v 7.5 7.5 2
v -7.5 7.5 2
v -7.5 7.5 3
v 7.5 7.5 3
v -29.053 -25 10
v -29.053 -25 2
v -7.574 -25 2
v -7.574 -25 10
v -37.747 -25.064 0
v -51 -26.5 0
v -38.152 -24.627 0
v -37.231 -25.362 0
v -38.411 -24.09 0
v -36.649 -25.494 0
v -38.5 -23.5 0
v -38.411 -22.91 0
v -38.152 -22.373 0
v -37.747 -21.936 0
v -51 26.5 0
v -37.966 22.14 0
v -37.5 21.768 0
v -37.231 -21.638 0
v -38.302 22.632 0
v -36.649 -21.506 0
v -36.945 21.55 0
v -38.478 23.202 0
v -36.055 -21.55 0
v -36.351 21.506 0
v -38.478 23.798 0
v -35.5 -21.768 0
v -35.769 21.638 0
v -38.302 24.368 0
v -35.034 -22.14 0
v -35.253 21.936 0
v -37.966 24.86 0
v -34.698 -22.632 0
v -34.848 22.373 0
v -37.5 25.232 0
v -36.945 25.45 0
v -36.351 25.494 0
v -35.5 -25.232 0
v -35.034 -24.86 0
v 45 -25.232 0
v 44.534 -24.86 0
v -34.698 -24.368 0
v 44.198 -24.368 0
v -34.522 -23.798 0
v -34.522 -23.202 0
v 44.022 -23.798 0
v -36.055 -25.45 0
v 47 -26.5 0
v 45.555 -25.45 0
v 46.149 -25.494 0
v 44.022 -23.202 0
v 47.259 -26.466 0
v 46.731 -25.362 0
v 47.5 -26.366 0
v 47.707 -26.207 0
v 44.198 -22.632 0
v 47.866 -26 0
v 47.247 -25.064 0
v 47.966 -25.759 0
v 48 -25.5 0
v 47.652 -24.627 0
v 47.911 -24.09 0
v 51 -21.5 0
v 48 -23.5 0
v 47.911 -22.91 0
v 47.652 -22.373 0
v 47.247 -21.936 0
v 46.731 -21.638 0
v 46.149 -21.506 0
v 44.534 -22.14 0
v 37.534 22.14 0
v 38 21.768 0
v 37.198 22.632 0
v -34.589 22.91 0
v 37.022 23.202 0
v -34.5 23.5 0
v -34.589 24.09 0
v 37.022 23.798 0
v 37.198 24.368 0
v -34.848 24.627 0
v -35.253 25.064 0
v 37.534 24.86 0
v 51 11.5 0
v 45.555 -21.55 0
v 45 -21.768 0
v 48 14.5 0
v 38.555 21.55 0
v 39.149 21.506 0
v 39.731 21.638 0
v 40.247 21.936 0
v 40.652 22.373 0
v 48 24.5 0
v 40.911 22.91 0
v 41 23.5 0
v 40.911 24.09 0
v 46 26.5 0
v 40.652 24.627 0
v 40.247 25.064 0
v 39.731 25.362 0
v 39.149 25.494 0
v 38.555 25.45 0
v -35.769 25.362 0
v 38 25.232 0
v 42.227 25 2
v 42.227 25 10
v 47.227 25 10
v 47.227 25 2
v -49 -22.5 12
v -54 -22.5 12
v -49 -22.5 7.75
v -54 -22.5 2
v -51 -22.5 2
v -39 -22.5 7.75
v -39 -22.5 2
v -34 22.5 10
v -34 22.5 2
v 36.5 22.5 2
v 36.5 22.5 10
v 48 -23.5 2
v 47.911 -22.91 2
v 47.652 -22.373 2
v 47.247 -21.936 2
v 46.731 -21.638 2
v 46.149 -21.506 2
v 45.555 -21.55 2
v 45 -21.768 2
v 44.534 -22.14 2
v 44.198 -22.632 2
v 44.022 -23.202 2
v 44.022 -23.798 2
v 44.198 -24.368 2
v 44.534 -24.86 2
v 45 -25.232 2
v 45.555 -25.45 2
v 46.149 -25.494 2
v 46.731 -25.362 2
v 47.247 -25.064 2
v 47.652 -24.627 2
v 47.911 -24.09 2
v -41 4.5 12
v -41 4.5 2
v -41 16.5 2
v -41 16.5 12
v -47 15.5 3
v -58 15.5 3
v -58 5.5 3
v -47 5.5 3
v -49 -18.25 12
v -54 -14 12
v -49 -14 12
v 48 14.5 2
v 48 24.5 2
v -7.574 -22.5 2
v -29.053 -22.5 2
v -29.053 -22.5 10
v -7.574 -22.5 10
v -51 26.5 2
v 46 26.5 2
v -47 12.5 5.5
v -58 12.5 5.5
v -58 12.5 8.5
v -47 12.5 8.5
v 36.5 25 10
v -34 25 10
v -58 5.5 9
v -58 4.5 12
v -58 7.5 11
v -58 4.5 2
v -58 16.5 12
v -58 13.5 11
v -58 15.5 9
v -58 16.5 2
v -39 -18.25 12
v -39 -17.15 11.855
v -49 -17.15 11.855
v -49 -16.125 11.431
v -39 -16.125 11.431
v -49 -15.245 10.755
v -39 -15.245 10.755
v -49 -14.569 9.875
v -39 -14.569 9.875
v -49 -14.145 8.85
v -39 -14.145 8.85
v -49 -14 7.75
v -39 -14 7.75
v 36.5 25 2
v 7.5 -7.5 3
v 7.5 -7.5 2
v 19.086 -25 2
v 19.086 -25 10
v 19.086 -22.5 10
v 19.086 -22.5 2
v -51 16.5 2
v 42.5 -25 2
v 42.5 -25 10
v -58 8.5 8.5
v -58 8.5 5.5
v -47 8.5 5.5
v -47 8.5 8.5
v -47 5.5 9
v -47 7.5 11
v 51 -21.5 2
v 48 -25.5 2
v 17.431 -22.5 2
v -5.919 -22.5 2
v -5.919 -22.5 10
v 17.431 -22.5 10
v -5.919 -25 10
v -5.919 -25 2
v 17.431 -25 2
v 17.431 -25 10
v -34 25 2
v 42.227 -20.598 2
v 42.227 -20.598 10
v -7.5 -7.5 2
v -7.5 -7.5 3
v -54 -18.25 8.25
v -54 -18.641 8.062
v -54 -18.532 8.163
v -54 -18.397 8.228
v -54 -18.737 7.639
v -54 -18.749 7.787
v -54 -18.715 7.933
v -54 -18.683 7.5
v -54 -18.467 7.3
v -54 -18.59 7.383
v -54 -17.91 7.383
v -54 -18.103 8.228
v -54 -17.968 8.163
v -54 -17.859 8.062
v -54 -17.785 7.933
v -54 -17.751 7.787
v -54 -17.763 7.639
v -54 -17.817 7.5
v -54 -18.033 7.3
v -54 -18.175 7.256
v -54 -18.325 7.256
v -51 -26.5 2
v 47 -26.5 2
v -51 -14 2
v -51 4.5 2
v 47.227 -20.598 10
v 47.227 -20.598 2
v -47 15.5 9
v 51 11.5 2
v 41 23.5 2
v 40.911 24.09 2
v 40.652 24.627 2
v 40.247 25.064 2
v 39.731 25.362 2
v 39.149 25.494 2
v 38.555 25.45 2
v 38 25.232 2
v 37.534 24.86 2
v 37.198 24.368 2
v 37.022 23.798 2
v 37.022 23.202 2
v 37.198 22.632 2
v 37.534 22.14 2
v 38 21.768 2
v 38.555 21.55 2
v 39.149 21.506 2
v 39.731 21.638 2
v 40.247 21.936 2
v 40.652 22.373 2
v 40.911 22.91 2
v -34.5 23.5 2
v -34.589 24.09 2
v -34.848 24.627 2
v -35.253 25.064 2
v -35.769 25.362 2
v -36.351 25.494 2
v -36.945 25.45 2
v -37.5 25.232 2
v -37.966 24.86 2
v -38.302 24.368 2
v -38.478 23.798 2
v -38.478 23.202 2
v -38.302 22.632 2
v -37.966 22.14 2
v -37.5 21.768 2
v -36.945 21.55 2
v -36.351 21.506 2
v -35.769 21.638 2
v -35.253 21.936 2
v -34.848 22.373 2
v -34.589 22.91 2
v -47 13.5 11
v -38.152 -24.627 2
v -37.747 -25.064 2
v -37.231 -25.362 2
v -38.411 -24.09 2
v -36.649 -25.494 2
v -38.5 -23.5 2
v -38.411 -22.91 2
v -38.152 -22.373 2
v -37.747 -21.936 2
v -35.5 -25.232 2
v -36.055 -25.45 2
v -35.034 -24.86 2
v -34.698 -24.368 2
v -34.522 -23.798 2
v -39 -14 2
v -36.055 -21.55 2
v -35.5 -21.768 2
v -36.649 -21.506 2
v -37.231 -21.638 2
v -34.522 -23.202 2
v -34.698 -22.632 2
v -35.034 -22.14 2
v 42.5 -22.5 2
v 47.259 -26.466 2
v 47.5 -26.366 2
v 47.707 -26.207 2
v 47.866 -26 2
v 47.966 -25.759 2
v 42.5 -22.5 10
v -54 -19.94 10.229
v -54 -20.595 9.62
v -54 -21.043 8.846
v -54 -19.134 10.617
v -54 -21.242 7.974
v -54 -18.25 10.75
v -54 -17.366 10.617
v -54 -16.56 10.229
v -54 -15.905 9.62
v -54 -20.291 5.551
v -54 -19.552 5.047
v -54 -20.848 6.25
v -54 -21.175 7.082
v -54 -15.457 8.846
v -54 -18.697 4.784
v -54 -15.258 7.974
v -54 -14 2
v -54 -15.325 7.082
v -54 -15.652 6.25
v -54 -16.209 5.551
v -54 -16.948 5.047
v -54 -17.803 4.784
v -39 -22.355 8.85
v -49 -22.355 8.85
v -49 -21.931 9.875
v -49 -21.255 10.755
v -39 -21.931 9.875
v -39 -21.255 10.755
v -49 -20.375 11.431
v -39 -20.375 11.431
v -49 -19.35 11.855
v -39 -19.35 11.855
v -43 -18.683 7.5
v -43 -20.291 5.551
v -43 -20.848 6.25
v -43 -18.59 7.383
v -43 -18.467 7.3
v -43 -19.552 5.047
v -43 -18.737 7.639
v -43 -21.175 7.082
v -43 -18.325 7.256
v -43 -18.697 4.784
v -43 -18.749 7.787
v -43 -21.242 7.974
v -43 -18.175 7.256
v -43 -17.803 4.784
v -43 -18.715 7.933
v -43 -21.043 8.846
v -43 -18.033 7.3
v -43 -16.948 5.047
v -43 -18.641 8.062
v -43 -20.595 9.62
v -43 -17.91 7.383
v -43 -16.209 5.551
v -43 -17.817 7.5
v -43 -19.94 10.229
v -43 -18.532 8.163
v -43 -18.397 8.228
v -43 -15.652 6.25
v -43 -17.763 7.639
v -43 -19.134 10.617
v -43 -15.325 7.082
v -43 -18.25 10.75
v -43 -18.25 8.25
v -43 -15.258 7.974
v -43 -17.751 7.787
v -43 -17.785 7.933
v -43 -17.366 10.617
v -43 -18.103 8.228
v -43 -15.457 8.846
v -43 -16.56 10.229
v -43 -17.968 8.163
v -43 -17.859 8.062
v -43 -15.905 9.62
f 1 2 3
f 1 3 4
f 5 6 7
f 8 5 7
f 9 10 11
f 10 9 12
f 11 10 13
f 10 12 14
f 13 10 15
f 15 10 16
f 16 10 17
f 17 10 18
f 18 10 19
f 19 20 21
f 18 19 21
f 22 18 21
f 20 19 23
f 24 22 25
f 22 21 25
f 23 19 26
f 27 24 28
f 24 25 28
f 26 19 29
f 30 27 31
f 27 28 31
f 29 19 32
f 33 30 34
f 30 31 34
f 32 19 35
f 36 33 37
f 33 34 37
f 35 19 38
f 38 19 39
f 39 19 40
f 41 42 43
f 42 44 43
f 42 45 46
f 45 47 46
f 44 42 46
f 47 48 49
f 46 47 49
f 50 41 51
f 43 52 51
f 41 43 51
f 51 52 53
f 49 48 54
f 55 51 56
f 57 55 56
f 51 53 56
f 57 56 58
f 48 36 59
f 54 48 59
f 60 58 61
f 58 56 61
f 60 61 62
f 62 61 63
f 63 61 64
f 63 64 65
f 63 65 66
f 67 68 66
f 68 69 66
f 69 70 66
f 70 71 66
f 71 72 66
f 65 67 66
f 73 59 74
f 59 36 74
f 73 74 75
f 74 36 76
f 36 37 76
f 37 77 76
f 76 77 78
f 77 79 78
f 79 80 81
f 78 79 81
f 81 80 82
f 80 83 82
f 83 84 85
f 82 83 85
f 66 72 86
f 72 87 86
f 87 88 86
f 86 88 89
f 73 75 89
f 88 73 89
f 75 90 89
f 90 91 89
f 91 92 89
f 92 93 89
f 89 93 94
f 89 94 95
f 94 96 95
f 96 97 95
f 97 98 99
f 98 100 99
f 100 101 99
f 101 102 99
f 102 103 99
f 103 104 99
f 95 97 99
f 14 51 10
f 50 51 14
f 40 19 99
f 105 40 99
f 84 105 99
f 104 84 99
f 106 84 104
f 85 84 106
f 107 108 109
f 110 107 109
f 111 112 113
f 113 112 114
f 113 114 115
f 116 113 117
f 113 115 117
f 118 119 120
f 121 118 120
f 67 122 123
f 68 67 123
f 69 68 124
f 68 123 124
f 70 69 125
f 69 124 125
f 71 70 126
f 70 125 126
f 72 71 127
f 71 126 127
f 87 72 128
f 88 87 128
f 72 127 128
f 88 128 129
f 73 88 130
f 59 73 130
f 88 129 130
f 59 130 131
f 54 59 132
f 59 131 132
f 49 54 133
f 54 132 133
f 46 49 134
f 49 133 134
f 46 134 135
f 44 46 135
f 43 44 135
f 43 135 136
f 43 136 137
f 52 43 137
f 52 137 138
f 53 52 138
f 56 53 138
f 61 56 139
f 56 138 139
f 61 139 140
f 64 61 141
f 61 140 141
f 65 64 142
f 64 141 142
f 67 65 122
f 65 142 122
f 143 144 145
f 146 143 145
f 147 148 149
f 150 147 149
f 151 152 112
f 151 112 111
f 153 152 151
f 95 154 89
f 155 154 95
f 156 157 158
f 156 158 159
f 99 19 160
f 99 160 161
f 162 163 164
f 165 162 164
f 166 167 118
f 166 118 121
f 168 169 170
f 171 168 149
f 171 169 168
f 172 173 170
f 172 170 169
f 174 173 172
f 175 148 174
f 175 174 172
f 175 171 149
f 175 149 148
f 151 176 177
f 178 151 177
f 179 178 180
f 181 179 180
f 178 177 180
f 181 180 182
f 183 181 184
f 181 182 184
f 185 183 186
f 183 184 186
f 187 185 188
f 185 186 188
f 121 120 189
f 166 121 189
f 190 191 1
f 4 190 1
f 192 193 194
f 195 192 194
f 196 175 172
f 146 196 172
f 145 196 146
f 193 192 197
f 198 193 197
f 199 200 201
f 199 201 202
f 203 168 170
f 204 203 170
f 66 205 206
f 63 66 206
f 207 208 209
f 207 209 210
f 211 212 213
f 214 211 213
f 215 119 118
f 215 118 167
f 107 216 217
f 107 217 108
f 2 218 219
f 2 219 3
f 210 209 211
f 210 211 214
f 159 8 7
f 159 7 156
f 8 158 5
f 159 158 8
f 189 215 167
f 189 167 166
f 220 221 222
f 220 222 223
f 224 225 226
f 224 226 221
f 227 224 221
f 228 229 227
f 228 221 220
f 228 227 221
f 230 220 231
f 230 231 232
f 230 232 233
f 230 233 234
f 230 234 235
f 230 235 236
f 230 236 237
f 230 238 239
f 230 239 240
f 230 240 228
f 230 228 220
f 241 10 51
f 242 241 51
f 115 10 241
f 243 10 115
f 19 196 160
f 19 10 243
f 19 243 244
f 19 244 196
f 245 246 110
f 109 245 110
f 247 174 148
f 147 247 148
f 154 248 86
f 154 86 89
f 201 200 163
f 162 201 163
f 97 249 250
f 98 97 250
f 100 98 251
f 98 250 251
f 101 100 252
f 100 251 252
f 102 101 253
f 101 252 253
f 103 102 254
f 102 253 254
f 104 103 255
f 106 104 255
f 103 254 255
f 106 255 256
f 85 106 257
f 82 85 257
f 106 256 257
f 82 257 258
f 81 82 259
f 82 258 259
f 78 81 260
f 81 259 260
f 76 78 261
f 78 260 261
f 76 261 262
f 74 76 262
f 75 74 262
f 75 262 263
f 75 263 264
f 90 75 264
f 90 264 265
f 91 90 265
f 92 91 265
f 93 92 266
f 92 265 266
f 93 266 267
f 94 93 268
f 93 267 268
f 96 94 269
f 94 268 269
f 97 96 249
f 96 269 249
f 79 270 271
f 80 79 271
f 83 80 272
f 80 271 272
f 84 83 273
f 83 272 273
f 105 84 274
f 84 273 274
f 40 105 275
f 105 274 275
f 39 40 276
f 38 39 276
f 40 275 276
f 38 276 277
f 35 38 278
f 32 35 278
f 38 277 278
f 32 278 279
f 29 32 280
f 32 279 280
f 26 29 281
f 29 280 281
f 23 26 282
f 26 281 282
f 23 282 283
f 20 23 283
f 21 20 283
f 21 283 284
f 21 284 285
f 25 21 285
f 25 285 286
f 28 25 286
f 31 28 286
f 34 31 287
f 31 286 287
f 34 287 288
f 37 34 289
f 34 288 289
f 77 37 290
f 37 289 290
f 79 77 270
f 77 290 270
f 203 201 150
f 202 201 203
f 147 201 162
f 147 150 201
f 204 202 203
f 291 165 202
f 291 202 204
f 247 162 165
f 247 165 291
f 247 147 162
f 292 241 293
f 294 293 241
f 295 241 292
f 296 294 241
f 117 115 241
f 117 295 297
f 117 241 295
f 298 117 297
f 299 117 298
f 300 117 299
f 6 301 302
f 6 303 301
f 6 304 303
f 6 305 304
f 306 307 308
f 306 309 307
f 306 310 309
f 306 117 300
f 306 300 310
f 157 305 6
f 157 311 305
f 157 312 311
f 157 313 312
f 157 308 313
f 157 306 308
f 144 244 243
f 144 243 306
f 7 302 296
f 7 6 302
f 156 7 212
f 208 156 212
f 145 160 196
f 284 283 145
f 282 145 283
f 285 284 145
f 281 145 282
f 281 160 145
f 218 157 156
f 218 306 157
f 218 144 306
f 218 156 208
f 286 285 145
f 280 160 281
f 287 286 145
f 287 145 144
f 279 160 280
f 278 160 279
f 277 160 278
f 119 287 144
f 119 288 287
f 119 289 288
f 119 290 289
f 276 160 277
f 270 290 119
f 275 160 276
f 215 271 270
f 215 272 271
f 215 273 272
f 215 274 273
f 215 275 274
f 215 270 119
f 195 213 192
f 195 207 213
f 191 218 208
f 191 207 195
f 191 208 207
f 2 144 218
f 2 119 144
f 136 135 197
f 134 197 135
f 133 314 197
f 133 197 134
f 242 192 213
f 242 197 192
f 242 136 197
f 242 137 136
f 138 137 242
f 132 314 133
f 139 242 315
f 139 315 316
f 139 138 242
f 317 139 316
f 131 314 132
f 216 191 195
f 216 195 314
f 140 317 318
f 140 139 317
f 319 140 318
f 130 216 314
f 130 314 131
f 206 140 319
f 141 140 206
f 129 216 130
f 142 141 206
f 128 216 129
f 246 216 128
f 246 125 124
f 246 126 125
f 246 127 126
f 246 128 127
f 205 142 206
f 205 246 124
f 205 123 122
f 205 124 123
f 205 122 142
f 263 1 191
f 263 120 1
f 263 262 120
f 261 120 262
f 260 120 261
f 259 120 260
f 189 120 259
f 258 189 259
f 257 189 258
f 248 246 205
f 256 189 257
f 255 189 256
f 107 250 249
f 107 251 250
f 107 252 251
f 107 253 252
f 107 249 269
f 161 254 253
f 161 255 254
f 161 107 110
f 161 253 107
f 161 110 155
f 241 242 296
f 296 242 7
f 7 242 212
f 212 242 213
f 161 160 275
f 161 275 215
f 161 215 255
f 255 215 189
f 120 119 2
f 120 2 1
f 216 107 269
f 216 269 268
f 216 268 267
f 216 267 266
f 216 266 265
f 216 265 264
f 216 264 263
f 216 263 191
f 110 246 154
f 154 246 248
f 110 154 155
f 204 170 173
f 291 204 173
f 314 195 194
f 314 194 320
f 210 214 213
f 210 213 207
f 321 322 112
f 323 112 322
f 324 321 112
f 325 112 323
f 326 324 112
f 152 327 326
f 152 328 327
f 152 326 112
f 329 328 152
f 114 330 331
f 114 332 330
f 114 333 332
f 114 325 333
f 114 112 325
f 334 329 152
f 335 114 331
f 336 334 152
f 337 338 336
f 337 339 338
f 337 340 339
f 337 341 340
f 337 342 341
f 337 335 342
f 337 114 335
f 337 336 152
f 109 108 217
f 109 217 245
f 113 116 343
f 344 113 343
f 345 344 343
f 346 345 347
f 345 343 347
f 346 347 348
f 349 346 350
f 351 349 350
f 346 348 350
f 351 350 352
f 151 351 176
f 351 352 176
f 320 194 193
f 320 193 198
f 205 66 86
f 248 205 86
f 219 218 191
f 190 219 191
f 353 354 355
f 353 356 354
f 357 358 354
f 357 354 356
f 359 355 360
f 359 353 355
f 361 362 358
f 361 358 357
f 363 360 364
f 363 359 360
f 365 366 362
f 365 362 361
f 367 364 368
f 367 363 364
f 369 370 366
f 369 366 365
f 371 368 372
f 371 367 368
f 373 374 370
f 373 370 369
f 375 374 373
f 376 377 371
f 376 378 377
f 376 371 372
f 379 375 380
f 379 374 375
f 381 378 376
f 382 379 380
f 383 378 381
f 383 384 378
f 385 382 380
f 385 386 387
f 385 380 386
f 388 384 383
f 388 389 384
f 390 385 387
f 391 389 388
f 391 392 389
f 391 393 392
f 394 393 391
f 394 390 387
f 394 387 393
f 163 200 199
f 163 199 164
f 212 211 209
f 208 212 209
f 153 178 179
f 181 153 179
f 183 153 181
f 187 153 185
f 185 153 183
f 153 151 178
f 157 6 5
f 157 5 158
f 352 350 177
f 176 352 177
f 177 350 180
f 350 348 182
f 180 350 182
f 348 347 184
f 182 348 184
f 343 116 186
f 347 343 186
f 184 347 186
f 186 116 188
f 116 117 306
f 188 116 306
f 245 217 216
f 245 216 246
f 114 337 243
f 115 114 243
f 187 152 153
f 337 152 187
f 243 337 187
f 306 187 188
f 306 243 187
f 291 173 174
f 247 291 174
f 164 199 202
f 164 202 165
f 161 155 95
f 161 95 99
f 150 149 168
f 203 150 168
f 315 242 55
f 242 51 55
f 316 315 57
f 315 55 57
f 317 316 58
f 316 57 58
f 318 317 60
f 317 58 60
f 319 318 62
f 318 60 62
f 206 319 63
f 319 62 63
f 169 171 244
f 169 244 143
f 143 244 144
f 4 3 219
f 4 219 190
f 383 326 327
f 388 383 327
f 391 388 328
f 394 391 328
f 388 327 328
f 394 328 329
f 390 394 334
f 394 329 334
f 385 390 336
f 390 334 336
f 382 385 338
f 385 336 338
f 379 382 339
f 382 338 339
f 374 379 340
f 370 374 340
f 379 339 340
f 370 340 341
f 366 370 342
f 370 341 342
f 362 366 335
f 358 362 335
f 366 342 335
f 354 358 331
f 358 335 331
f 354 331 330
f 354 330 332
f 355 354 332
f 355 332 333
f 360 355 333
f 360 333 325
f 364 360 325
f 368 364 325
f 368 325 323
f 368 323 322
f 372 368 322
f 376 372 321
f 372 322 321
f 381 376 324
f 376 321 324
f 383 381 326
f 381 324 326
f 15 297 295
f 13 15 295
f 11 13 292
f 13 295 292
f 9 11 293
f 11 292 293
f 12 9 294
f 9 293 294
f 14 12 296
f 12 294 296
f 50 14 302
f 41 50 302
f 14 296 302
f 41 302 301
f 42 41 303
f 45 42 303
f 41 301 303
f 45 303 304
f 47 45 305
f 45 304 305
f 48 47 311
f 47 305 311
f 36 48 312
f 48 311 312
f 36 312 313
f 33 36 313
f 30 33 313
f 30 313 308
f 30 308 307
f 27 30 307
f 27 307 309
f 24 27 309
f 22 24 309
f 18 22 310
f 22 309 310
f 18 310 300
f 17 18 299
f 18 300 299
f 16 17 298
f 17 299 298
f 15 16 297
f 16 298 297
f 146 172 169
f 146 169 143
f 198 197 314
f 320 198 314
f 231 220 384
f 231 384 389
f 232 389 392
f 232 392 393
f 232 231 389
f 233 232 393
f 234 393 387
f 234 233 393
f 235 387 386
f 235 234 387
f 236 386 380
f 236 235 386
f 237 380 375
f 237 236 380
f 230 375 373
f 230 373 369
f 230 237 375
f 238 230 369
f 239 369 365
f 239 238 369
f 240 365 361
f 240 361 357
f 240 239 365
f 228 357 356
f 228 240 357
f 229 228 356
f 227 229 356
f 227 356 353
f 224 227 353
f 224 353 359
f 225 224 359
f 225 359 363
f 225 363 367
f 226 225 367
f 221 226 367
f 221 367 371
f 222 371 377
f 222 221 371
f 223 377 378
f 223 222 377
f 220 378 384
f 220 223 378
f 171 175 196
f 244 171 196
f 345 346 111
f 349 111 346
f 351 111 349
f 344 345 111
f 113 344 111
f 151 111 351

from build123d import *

# Parameters (mm, degrees)
SKETCH_2_W          = 102
SKETCH_2_H          = 53
EXTRUDE_1_DEPTH     = 2
CUT_EXTRUDE_1_DEPTH = 2
SKETCH_4_R          = 2
CUT_EXTRUDE_2_DEPTH = 2
FILLET_1_R          = 1
SKETCH_5_R          = 2
CUT_EXTRUDE_3_DEPTH = 2
SKETCH_6_W          = 17
SKETCH_6_H          = 12
EXTRUDE_2_DEPTH     = 10
SKETCH_7_W          = 70.5
SKETCH_7_H          = 2.5
SKETCH_7_W_2        = 5
SKETCH_7_H_2        = 45.597878471
SKETCH_7_W_3        = 71.552945179
EXTRUDE_3_DEPTH     = 8
SKETCH_8_W          = 15
SKETCH_8_H          = 15
EXTRUDE_4_DEPTH     = 1
SKETCH_9_W          = 1.65475178
SKETCH_9_H          = 2.5
CUT_EXTRUDE_4_DEPTH = 8
SKETCH_10_W         = 15
SKETCH_10_H         = 8.5
EXTRUDE_5_DEPTH     = 10
CUT_EXTRUDE_5_DEPTH = 10
SKETCH_12_R         = 3
SKETCH_12_R_2       = 0.5
CUT_EXTRUDE_6_DEPTH = 11
SKETCH_13_W         = 3
SKETCH_13_H         = 4
CUT_EXTRUDE_7_DEPTH = 11


with BuildPart() as part:
    # 草图2 → 凸台-拉伸1 (new body)
    with BuildSketch(Plane.XY):
        Rectangle(SKETCH_2_W, SKETCH_2_H)
    extrude(amount=EXTRUDE_1_DEPTH)

    # 草图3 → 切除-拉伸1 (cut)
    with BuildSketch(Plane.XY.offset(2)):
        Polygon((51, 11.5), (48, 14.5), (48, 24.5), (46, 26.5), (51, 26.5), align=None)
        Polygon((51, -21.5), (48, -25.5), (48, -26.5), (51, -26.5), align=None)
    extrude(amount=-CUT_EXTRUDE_1_DEPTH, mode=Mode.SUBTRACT)

    # 草图4 → 切除-拉伸2 (cut)
    with BuildSketch(Plane.XY.offset(2)):
        with Locations((46, -23.5)):
            Circle(SKETCH_4_R)
    extrude(amount=-CUT_EXTRUDE_2_DEPTH, mode=Mode.SUBTRACT)

    # 圆角1
    fillet_1_edges = [part.edges().sort_by_distance(p)[0] for p in [
        (48, -26.5, 1),
    ]]
    fillet(fillet_1_edges, radius=FILLET_1_R - 0.0001)  # a hair under: the kernel refuses the full size

    # 草图5 → 切除-拉伸3 (cut)
    with BuildSketch(Plane.XY.offset(2)):
        with Locations((39, 23.5)):
            Circle(SKETCH_5_R)
        with Locations((-36.5, 23.5)):
            Circle(SKETCH_5_R)
        with Locations(Location((-36.5, -23.5, 0), (0, 0, 180))):
            Circle(SKETCH_5_R)
    extrude(amount=-CUT_EXTRUDE_3_DEPTH, mode=Mode.SUBTRACT)

    # 草图6 → 凸台-拉伸2 (add)
    with BuildSketch(Plane.XY.offset(2)):
        with Locations((-49.5, 10.5)):
            Rectangle(SKETCH_6_W, SKETCH_6_H)
    extrude(amount=EXTRUDE_2_DEPTH)

    # 草图7 → 凸台-拉伸3 (add)
    with BuildSketch(Plane.XY.offset(2)):
        with Locations((1.25, 23.75)):
            Rectangle(SKETCH_7_W, SKETCH_7_H)
        with Locations((44.72661283, 2.201060764)):
            Rectangle(SKETCH_7_W_2, SKETCH_7_H_2)
        with Locations((6.72352741, -23.75)):
            Rectangle(SKETCH_7_W_3, SKETCH_7_H)
    extrude(amount=EXTRUDE_3_DEPTH)

    # 草图8 → 凸台-拉伸4 (add)
    with BuildSketch(Plane.XY.offset(2)):
        Rectangle(SKETCH_8_W, SKETCH_8_H)
    extrude(amount=EXTRUDE_4_DEPTH)

    # 草图9 → 切除-拉伸4 (cut)
    with BuildSketch(Plane.XY.offset(10)):
        with Locations((-6.746736472, -23.75)):
            Rectangle(SKETCH_9_W, SKETCH_9_H)
        with Locations((18.258401548, -23.75)):
            Rectangle(SKETCH_9_W, SKETCH_9_H)
    extrude(amount=-CUT_EXTRUDE_4_DEPTH, mode=Mode.SUBTRACT)

    # 草图10 → 凸台-拉伸5 (add)
    with BuildSketch(Plane.XY.offset(2)):
        with Locations((-46.5, -18.25)):
            Rectangle(SKETCH_10_W, SKETCH_10_H)
    extrude(amount=EXTRUDE_5_DEPTH)

    # 草图11 → 切除-拉伸5 (cut)
    with BuildSketch(Plane(origin=(-39, 0, 0), x_dir=(0, 0, -1), z_dir=(1, 0, 0))):
        with BuildLine():
            ThreePointArc((-7.75, -22.5), (-10.75520382, -21.25520382), (-12, -18.25))
            Line((-12, -18.25), (-12, -22.5))
            Line((-12, -22.5), (-7.75, -22.5))
        make_face()
        with BuildLine():
            Line((-7.75, -14), (-12, -14))
            Line((-12, -14), (-12, -18.25))
            ThreePointArc((-12, -18.25), (-10.75520382, -15.24479618), (-7.75, -14))
        make_face()
    extrude(amount=-CUT_EXTRUDE_5_DEPTH, mode=Mode.SUBTRACT)

    # 草图12 → 切除-拉伸6 (cut)
    with BuildSketch(Plane.ZY.offset(54)):
        with Locations((7.75, -18.25)):
            Circle(SKETCH_12_R)
        with Locations((7.75, -18.25)):
            Circle(SKETCH_12_R_2, mode=Mode.SUBTRACT)
    extrude(amount=-CUT_EXTRUDE_6_DEPTH, mode=Mode.SUBTRACT)

    # 草图13 → 切除-拉伸7 (cut)
    with BuildSketch(Plane.ZY.offset(58)):
        Polygon((11, 13.5), (9, 15.5), (3, 15.5), (3, 5.5), (9, 5.5), (11, 7.5), align=None)
        with Locations((7, 10.5)):
            Rectangle(SKETCH_13_W, SKETCH_13_H, mode=Mode.SUBTRACT)
    extrude(amount=-CUT_EXTRUDE_7_DEPTH, mode=Mode.SUBTRACT)


solid = part.part
